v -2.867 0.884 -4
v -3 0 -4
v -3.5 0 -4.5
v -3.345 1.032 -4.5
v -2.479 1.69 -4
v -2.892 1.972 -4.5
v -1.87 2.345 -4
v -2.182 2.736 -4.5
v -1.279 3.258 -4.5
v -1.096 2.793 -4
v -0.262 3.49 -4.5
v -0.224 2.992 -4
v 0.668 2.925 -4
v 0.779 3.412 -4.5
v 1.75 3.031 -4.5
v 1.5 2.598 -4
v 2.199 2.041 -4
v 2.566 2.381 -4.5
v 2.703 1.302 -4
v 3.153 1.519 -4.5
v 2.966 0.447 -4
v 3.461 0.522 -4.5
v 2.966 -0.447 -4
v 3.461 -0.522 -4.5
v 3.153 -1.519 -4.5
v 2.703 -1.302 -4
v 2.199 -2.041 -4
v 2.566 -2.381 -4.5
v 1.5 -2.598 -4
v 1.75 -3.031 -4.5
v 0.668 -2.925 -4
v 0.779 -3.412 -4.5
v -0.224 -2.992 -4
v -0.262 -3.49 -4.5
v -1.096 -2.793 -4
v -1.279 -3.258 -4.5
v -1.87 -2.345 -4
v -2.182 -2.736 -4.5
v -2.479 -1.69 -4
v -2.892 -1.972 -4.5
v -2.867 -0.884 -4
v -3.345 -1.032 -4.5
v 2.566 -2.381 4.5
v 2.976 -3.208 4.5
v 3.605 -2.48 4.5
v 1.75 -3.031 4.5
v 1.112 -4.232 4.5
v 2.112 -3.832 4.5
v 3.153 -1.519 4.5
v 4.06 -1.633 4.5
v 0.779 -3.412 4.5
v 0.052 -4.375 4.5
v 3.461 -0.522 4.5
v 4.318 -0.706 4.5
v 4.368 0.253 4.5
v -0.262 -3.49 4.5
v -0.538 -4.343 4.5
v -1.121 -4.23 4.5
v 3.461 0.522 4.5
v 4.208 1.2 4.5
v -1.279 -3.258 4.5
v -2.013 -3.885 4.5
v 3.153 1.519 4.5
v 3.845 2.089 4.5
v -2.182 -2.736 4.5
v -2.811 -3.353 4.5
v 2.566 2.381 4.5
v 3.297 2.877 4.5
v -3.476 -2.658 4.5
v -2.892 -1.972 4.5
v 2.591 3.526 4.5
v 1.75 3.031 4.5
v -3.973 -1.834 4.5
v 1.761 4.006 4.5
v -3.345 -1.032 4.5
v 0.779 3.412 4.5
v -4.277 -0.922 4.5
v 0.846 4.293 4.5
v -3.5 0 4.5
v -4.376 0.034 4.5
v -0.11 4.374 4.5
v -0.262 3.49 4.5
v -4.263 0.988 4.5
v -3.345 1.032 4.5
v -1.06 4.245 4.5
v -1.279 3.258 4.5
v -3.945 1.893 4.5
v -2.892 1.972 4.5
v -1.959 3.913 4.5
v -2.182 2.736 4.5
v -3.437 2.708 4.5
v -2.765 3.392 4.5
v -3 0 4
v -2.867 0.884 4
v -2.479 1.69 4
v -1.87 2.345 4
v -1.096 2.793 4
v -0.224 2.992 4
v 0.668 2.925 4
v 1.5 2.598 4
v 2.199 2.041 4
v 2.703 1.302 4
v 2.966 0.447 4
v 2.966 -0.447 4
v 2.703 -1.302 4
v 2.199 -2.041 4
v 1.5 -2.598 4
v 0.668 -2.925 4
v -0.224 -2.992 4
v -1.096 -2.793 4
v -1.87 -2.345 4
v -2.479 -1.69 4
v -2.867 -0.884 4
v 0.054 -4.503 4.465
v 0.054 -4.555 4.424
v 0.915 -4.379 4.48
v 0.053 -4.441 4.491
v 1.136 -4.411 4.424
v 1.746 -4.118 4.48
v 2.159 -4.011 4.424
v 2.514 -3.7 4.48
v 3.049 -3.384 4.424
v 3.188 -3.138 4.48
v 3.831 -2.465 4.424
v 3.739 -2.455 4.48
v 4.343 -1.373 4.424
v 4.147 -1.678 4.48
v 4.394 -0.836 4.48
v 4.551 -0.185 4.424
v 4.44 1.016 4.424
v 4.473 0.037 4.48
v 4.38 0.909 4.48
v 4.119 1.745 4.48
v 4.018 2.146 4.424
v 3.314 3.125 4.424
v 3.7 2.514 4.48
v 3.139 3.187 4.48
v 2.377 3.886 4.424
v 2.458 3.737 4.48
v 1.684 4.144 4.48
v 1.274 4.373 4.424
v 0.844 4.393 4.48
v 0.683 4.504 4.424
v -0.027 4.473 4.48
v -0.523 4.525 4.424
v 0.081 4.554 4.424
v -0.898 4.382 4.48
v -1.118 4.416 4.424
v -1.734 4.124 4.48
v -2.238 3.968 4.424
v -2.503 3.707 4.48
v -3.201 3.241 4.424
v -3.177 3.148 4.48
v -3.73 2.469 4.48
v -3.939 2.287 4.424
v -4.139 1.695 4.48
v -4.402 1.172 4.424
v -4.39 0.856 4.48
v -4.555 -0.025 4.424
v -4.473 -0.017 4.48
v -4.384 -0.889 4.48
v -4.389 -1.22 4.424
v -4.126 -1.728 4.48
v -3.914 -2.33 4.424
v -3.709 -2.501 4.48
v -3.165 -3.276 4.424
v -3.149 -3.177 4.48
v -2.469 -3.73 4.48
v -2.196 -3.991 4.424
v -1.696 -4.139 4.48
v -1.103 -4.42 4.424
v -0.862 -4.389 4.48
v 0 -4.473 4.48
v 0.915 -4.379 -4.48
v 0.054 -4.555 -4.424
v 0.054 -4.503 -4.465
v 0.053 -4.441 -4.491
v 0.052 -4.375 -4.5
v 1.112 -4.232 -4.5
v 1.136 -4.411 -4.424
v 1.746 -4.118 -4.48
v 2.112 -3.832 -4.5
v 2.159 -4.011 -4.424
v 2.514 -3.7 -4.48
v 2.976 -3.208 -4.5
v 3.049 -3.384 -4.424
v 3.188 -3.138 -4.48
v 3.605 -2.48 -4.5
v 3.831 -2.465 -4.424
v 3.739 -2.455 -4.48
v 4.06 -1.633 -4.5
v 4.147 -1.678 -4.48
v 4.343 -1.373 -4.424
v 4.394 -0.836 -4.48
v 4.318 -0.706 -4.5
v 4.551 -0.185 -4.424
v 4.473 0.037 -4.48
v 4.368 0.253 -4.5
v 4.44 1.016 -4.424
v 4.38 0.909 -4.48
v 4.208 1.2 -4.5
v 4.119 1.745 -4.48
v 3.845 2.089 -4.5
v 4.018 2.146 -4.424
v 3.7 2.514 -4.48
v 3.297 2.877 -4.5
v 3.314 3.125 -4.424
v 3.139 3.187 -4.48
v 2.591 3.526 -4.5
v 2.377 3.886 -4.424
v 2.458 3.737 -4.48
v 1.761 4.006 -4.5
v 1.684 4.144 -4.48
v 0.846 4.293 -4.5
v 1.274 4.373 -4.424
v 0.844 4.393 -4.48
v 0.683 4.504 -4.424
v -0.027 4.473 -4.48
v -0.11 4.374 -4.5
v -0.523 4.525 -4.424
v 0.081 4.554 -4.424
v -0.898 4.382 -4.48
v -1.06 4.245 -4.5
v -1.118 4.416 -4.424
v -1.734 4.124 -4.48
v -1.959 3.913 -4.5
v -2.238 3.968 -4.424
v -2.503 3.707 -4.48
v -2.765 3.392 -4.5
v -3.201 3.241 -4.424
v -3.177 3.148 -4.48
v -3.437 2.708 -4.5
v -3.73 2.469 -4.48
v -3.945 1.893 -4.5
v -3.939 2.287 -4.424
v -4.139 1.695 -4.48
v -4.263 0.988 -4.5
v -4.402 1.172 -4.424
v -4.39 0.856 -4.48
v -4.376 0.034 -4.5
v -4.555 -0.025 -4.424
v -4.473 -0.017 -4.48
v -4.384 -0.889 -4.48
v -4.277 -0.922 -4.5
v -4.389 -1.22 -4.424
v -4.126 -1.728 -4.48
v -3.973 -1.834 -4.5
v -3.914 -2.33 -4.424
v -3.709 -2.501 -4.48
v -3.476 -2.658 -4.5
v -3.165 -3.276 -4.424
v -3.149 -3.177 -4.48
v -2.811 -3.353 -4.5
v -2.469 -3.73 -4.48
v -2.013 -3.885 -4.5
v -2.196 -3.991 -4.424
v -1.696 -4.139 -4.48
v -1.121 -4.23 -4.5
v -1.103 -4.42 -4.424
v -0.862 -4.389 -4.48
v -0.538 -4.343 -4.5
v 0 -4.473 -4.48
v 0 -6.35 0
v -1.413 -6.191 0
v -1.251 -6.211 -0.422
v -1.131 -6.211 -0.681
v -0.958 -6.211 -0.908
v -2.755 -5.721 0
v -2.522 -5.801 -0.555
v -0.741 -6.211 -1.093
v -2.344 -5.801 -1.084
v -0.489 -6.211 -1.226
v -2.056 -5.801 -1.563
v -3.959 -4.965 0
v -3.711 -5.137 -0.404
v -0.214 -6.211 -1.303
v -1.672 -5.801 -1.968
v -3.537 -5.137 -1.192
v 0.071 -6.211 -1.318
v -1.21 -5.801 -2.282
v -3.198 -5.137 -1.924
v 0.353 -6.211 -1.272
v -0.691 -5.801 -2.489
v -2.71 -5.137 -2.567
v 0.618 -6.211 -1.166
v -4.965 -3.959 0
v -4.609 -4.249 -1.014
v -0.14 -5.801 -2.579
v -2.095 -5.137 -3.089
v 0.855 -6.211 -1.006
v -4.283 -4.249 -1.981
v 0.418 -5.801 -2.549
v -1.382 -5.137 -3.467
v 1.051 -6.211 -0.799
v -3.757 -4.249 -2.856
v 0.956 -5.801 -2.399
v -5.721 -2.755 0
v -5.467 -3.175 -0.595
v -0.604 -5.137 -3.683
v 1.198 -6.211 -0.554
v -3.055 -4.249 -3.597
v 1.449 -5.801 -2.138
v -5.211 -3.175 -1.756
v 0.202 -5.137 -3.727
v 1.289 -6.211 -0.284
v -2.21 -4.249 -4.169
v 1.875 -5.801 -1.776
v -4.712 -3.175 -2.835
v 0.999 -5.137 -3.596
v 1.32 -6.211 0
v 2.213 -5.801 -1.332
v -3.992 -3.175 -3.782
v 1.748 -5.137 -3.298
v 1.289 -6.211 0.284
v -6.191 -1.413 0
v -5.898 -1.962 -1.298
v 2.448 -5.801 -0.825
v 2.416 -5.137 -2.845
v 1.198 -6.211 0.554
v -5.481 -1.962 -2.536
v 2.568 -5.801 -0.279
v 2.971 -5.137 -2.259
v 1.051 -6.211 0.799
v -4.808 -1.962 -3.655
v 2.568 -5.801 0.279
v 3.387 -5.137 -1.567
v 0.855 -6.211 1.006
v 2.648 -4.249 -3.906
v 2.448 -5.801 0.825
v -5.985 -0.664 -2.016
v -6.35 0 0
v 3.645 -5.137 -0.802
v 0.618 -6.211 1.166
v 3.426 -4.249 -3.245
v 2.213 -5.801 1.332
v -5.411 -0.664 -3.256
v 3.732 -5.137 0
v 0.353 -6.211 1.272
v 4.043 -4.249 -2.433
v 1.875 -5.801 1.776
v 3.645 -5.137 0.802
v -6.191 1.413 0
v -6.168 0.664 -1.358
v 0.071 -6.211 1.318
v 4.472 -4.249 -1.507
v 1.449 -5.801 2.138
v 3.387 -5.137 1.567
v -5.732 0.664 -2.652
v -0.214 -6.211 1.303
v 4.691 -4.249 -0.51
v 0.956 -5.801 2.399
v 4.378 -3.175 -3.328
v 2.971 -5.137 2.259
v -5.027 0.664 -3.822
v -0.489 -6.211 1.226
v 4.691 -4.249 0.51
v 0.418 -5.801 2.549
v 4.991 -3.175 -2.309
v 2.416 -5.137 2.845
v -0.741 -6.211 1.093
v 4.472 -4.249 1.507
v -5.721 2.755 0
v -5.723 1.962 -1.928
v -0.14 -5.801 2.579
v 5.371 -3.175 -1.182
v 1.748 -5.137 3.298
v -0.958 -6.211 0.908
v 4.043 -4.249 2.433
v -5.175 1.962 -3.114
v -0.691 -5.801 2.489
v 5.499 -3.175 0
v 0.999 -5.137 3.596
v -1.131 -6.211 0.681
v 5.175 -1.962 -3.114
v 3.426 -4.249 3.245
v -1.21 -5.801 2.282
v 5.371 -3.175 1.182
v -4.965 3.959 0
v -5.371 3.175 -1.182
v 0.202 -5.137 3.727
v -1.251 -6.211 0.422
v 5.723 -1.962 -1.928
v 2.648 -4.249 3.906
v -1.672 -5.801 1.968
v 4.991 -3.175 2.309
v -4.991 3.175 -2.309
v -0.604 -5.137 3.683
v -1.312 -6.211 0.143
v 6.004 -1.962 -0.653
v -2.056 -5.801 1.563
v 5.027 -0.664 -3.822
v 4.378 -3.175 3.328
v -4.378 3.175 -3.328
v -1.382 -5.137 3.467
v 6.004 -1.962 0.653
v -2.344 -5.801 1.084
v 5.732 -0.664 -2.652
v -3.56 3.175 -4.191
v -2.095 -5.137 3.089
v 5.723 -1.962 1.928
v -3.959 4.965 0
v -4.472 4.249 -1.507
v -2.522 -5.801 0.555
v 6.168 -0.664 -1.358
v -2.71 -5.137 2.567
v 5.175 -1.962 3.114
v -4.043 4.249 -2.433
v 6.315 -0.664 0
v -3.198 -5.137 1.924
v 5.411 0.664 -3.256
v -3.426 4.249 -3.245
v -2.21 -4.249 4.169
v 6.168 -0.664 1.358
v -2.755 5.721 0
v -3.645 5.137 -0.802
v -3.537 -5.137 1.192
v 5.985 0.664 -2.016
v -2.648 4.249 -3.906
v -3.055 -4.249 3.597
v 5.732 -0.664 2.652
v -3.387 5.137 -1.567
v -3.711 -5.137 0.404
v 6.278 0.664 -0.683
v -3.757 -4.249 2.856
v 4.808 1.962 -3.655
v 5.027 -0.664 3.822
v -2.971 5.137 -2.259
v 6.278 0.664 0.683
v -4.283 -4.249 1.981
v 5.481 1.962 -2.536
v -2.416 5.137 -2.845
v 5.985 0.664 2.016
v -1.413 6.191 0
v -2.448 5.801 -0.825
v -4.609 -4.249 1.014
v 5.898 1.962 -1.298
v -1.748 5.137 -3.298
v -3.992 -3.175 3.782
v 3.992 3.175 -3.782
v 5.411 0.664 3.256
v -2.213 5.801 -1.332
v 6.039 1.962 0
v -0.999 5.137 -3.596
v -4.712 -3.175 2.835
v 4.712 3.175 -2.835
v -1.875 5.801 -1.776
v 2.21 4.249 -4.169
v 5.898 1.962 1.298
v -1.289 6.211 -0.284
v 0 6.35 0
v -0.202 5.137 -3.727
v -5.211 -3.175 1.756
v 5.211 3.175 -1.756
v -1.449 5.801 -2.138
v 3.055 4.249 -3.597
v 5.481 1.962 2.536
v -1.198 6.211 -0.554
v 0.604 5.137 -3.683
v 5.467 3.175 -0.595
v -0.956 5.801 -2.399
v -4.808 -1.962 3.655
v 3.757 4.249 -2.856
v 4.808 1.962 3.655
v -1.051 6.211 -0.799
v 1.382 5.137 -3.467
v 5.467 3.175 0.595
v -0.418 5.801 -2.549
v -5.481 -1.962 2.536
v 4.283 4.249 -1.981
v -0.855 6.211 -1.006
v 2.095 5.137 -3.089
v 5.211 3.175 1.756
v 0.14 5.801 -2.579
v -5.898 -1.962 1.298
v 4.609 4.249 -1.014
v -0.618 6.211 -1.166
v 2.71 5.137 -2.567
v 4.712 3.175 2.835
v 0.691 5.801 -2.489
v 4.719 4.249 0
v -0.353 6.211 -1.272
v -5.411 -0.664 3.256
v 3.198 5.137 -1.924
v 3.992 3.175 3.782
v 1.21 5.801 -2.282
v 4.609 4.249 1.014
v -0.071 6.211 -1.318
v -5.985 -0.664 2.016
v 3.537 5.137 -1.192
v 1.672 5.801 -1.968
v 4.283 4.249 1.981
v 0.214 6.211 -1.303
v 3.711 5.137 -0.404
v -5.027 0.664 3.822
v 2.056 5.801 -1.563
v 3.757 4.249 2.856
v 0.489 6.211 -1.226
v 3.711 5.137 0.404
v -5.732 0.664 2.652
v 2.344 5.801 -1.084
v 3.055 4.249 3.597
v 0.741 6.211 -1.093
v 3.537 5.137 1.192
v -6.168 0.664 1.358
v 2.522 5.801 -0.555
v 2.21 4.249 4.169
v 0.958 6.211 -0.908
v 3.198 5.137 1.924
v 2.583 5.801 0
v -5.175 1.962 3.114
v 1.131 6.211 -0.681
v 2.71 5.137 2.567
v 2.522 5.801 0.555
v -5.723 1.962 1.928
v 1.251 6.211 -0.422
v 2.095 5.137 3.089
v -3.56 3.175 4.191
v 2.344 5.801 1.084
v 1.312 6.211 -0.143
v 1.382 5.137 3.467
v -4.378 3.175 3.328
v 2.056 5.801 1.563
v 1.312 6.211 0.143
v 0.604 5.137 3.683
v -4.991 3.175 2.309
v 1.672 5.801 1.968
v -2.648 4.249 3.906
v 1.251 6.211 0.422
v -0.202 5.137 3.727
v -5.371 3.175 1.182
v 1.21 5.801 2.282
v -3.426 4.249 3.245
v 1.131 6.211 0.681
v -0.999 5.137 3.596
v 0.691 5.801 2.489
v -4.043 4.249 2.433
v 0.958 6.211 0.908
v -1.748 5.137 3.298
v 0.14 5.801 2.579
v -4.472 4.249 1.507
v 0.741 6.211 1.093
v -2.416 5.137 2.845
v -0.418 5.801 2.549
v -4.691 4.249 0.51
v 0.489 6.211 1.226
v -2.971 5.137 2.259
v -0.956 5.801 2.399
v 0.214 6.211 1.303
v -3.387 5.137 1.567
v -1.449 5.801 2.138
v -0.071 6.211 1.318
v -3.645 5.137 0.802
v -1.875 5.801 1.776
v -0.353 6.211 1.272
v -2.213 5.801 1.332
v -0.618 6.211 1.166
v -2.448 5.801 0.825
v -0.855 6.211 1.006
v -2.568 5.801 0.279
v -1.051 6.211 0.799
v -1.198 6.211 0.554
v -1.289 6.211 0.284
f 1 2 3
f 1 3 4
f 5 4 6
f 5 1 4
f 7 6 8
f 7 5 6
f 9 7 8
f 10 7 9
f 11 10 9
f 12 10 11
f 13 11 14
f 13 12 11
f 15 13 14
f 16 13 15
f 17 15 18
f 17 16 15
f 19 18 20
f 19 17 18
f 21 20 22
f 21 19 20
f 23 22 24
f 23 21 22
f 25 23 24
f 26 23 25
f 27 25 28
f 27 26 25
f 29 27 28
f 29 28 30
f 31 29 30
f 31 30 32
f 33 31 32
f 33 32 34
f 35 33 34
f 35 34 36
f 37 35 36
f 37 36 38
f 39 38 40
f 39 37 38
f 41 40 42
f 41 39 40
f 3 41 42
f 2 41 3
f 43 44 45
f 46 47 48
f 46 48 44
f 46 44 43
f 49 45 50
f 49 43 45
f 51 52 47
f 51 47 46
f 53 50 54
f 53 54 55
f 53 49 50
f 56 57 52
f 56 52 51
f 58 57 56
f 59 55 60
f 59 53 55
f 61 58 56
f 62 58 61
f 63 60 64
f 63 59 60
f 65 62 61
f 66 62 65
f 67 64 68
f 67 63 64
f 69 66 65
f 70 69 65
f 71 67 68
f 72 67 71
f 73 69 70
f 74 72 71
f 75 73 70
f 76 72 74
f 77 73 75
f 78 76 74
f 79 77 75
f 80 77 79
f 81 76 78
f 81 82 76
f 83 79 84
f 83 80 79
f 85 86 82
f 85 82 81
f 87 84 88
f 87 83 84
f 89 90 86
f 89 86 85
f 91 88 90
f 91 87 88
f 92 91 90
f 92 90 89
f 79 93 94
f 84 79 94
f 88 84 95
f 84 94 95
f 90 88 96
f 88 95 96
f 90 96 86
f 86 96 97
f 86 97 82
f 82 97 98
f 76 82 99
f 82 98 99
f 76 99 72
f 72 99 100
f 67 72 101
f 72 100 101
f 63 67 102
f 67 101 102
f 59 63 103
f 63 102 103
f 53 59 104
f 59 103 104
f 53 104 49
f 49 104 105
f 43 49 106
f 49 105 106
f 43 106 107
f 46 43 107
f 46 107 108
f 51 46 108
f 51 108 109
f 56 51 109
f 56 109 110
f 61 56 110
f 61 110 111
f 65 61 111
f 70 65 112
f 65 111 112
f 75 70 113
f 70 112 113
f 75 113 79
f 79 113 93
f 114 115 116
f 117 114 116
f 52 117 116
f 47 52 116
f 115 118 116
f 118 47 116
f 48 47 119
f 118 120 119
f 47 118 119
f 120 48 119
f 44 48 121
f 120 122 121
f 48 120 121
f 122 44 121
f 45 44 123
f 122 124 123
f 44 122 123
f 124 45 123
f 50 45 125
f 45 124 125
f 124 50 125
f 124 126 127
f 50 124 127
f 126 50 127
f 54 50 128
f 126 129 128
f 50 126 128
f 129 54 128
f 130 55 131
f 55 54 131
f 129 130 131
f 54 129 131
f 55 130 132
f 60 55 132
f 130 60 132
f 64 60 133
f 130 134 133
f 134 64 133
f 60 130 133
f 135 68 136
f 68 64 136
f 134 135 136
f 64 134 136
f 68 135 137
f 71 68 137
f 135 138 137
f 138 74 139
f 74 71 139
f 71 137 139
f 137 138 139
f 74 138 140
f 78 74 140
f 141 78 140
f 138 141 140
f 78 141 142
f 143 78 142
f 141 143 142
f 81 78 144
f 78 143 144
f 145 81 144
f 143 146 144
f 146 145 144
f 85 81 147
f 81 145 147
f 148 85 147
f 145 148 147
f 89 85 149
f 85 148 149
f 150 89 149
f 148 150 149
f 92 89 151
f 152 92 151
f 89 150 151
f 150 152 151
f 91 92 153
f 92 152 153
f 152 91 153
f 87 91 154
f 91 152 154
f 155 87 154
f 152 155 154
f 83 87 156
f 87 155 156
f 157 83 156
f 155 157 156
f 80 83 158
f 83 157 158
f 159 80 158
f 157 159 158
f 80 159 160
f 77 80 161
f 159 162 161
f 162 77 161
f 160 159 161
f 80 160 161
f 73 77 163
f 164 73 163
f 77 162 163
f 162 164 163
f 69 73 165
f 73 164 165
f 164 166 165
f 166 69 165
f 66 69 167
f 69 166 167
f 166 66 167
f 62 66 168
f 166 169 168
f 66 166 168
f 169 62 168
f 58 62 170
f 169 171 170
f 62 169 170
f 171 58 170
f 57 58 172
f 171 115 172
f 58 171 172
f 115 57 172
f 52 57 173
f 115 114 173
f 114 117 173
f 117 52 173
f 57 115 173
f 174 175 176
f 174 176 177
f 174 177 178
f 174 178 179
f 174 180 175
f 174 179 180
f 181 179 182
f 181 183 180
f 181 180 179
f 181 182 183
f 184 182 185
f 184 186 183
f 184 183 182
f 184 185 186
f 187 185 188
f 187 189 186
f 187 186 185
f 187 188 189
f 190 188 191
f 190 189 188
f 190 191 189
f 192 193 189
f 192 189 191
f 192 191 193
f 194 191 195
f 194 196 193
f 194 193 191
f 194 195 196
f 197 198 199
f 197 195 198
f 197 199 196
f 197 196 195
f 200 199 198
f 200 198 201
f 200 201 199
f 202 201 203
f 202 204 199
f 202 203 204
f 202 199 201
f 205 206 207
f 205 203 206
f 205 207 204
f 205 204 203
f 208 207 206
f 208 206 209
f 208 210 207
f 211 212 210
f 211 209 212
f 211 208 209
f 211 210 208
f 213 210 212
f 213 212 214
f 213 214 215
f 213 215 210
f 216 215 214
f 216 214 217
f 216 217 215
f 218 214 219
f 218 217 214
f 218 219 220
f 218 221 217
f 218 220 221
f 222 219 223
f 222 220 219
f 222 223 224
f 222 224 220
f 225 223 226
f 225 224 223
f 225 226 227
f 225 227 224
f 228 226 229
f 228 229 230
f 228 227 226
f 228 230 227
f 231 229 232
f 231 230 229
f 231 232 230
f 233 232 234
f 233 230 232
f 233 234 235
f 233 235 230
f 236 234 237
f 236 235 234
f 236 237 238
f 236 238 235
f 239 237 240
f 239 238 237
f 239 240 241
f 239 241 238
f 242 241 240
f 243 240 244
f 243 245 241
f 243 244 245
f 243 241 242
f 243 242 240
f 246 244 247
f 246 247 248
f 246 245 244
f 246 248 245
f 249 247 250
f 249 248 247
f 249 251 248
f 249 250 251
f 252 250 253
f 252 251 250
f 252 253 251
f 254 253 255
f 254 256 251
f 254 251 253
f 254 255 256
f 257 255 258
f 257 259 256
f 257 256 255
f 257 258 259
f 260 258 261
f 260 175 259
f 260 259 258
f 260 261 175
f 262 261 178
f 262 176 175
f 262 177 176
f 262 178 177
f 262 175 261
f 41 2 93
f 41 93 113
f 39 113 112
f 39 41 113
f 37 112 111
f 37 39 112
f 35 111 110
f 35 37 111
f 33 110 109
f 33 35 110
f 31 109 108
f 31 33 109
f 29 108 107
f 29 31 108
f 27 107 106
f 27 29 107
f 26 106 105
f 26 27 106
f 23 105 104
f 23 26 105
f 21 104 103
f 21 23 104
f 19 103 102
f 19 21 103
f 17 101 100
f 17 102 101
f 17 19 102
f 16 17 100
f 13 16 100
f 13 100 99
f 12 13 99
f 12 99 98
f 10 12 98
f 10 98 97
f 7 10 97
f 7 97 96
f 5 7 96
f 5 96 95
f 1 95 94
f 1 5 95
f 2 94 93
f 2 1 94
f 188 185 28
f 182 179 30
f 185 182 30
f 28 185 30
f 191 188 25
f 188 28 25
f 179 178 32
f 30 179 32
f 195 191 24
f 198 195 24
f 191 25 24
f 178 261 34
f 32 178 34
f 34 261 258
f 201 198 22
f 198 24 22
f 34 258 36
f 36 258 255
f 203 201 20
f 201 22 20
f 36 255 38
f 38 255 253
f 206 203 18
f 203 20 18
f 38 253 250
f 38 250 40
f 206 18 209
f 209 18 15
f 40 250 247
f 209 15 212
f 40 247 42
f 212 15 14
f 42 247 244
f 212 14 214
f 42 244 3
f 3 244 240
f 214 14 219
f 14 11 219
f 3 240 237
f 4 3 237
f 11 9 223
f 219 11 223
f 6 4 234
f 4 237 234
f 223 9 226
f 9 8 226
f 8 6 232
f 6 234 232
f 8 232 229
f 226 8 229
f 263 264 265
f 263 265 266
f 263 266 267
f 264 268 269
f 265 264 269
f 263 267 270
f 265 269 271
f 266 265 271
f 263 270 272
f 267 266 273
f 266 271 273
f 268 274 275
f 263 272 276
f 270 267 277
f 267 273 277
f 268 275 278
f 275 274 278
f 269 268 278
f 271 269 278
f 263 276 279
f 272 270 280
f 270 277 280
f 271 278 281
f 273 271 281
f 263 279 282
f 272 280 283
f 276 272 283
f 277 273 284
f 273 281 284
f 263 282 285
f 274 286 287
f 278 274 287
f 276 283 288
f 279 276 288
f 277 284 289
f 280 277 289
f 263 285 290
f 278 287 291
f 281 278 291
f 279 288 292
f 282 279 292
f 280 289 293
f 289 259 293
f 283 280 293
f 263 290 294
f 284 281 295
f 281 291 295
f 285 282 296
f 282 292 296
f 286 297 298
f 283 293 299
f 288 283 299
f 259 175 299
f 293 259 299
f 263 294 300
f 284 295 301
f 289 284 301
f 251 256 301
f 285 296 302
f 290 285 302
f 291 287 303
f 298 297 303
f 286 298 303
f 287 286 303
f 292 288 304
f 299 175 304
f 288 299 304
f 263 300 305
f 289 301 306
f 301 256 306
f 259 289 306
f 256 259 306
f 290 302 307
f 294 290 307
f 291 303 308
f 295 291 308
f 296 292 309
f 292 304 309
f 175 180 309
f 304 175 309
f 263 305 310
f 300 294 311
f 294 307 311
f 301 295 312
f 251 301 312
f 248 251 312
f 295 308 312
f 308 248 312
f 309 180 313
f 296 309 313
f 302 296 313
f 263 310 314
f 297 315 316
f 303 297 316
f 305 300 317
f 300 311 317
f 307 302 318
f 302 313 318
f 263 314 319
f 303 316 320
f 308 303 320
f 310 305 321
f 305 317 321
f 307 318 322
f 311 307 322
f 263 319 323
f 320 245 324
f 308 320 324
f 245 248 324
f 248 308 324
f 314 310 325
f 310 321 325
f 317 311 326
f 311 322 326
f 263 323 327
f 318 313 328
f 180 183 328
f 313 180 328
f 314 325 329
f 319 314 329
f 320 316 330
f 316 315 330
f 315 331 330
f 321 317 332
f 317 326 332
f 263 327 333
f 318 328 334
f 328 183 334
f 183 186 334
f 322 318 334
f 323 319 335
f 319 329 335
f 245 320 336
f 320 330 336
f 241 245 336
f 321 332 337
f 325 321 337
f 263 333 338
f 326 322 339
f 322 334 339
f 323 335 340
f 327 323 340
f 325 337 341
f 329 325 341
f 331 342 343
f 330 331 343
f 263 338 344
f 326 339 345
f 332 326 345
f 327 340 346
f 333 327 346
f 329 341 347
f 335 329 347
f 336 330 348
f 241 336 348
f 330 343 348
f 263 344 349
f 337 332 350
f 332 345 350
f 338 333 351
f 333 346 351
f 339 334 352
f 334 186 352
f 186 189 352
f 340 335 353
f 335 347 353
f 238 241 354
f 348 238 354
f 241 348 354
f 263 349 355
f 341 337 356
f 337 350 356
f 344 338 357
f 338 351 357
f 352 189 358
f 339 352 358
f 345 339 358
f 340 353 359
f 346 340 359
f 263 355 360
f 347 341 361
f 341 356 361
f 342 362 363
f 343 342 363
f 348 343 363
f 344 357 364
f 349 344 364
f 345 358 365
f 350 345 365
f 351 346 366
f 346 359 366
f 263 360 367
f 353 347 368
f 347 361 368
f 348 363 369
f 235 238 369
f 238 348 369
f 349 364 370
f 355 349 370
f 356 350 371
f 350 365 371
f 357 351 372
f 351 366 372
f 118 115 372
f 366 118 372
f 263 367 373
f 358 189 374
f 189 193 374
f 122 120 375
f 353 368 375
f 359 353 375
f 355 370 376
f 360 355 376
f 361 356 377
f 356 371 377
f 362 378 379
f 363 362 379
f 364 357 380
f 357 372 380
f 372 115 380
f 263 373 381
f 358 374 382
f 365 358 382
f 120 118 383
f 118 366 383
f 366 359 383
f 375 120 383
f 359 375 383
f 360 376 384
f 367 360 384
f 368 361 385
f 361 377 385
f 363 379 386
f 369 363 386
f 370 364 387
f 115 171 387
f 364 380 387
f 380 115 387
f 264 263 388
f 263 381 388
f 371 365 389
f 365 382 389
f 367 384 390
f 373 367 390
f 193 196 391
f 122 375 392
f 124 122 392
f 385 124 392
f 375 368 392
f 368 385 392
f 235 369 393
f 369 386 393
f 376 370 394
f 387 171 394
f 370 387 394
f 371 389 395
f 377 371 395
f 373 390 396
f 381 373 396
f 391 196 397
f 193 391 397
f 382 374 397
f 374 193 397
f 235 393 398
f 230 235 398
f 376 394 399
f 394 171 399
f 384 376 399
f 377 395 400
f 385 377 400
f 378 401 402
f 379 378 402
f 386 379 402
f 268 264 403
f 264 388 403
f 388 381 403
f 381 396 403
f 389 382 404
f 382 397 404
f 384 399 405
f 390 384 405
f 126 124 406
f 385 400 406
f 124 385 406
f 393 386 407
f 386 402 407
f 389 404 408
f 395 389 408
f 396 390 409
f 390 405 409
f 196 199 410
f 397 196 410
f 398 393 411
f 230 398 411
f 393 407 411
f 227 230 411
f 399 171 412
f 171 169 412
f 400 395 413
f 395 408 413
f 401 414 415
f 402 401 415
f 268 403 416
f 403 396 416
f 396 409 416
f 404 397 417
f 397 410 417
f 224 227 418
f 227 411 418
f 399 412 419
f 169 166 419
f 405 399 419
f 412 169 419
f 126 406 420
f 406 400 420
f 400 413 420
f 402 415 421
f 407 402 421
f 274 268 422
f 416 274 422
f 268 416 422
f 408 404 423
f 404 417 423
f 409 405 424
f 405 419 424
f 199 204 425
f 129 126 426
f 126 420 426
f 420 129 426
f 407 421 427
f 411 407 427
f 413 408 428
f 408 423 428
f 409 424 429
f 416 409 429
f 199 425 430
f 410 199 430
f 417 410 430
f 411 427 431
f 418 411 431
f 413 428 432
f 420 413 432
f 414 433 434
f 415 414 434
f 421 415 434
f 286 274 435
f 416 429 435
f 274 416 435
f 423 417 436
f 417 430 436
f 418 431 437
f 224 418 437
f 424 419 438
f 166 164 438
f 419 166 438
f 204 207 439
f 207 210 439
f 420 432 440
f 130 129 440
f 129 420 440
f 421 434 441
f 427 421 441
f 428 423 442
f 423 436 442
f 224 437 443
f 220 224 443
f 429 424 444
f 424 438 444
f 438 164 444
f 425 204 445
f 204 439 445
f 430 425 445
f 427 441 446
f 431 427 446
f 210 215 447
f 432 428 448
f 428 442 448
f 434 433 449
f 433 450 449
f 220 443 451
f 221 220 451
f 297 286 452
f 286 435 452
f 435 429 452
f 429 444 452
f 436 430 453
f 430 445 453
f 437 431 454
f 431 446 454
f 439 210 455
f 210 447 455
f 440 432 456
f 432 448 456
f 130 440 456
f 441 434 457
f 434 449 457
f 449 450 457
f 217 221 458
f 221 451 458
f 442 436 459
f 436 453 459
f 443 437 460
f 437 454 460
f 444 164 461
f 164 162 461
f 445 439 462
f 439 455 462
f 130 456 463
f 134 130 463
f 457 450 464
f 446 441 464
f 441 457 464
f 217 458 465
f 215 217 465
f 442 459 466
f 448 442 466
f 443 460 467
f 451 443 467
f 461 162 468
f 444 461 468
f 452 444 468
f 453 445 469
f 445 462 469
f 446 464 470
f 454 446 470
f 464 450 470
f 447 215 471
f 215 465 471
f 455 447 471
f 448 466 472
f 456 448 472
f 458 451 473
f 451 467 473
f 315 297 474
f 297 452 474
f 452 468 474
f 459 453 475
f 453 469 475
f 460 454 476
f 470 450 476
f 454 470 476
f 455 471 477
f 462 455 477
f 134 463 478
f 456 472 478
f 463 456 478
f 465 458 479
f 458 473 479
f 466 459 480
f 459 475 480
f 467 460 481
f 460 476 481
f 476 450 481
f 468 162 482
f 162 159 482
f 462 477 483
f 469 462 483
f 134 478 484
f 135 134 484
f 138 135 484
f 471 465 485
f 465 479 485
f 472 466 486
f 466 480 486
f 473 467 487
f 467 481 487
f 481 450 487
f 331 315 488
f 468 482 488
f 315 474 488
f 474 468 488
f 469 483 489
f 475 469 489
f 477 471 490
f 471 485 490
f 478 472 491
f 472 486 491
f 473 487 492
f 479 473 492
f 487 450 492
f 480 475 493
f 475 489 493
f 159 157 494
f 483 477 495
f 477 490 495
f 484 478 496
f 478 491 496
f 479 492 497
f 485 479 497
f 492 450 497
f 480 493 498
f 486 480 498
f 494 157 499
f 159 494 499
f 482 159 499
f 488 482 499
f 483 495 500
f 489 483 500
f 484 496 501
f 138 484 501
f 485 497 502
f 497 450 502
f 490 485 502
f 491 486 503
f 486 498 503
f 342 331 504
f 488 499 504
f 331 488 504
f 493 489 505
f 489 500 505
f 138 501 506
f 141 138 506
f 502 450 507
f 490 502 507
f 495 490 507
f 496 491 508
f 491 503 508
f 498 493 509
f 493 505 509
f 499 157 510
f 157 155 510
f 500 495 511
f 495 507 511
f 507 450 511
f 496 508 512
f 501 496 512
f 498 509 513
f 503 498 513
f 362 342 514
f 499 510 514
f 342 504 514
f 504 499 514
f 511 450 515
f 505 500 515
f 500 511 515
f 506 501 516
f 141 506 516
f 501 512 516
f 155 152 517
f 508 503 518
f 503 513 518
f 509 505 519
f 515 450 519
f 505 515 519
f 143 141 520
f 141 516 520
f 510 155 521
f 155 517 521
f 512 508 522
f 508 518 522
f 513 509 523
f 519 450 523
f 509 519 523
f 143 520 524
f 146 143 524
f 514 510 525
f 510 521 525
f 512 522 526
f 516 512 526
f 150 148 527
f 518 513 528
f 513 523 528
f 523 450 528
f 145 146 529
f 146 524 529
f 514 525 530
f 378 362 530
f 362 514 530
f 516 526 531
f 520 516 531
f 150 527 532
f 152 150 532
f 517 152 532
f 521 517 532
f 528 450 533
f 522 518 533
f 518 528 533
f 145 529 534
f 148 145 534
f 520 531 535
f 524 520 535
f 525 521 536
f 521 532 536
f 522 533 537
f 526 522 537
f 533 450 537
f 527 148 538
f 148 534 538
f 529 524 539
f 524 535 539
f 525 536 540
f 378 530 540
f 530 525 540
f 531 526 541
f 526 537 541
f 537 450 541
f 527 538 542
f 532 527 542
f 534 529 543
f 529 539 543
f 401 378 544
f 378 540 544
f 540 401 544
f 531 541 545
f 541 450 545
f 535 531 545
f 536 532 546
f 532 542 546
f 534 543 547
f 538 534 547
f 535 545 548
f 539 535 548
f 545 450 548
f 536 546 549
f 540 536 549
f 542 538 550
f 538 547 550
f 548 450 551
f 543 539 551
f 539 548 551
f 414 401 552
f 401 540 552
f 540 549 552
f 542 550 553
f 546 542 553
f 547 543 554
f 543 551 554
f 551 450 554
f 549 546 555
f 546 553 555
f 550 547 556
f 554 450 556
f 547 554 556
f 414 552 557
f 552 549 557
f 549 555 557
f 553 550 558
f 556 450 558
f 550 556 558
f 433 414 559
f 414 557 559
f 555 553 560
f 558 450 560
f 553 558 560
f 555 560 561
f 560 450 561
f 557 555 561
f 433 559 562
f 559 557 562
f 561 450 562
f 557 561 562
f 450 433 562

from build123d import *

# Parameters (mm, degrees)
CORTAR_EXTRUIR1_DEPTH      = 11.998522628
CORTAR_EXTRUIR1_DEPTH_BACK = 11.998522628
CROQUIS2_R                 = 3
CORTAR_EXTRUIR2_DEPTH      = 11.998522628
CORTAR_EXTRUIR2_DEPTH_BACK = 11.998522628
CROQUIS3_W                 = 1.096650784
CROQUIS3_H                 = 12.7
REDONDEO1_R                = 0.25
CHAFL_N1_SIZE              = 0.5


with BuildPart() as part:
    # Croquis1 → Revolución1 (revolve)
    with BuildSketch(Plane.XY):
        with BuildLine():
            Line((0, 6.35), (0, -6.35))
            ThreePointArc((0, -6.35), (-6.35, 0), (0, 6.35))
        make_face()
    revolve(axis=Axis((0, 6.35, 0), (0, -1, 0)))

    # Croquis2 → Cortar-Extruir1 (cut, two sides: drawn at the far end of the back side and taken through both)
    with BuildSketch(Plane.XY.offset(-CORTAR_EXTRUIR1_DEPTH_BACK)):
        with Locations(Location((0, 0, 0), (0, 0, 180))):
            Circle(CROQUIS2_R)
    extrude(amount=CORTAR_EXTRUIR1_DEPTH + CORTAR_EXTRUIR1_DEPTH_BACK, mode=Mode.SUBTRACT)

    # Croquis3 → Cortar-Extruir2 (cut, two sides: drawn at the far end of the back side and taken through both)
    with BuildSketch(Plane(origin=(0, 0, 0), x_dir=(0, 0, -1), z_dir=(1, 0, 0)).offset(-CORTAR_EXTRUIR2_DEPTH_BACK)):
        with Locations((5.048325392, 0)):
            Rectangle(CROQUIS3_W, CROQUIS3_H)
        with Locations((-5.048325392, 0)):
            Rectangle(CROQUIS3_W, CROQUIS3_H)
    extrude(amount=CORTAR_EXTRUIR2_DEPTH + CORTAR_EXTRUIR2_DEPTH_BACK, mode=Mode.SUBTRACT)

    # Redondeo1
    redondeo1_edges = [part.edges().sort_by_distance(p)[0] for p in [
        (0, -4.480234369, 4.5),
        (0, 4.480234369, -4.5),
    ]]
    fillet(redondeo1_edges, radius=REDONDEO1_R)

    # Chaflán1
    chafl_n1_edges = [part.edges().sort_by_distance(p)[0] for p in [
        (3, 0, 4.5),
        (3, 0, -4.5),
    ]]
    chamfer(chafl_n1_edges, length=CHAFL_N1_SIZE)


solid = part.part
